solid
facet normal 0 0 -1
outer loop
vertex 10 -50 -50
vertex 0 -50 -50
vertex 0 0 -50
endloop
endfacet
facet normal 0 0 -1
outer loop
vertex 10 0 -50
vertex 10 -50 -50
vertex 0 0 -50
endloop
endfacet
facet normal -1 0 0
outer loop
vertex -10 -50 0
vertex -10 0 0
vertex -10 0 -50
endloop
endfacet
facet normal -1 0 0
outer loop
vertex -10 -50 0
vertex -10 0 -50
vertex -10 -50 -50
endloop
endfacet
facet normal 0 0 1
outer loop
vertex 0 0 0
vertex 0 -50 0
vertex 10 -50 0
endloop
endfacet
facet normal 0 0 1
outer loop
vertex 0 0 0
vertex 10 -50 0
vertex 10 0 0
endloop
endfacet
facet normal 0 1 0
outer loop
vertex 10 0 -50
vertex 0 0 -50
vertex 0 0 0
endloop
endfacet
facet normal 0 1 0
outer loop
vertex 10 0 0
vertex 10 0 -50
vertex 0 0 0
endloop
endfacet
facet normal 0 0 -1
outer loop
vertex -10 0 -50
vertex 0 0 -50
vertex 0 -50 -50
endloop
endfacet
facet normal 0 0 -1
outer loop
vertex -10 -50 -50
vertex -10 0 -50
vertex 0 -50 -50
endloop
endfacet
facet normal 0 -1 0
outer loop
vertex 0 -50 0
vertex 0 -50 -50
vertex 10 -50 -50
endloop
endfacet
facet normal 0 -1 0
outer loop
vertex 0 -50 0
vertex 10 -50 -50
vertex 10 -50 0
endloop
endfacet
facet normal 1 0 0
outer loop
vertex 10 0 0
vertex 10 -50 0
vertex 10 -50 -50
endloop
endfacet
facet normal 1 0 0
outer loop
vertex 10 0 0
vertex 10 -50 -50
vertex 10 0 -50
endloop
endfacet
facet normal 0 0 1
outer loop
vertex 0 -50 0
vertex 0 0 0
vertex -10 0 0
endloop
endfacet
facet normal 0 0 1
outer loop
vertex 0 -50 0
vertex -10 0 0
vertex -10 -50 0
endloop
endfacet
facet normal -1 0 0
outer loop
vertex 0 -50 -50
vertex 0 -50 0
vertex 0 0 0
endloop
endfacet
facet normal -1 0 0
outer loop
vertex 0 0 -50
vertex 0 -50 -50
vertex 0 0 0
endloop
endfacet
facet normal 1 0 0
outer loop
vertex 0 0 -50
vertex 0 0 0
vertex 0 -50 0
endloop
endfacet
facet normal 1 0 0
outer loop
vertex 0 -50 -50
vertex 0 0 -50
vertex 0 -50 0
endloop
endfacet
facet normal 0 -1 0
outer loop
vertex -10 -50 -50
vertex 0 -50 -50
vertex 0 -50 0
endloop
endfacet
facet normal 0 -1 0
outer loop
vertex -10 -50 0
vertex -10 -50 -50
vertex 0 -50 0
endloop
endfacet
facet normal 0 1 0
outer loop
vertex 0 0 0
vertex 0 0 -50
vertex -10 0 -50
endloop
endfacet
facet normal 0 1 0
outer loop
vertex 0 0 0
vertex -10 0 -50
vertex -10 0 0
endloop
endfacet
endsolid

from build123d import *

# Parameters (mm, degrees)
F0_W     = 50
F0_H     = 50
F1_DEPTH = 10
F2_W     = 50
F2_H     = 50
F3_DEPTH = 10


with BuildPart() as f1:
    # F0 (on Right) → F1 (new body)
    with BuildSketch(Plane.YZ):
        with Locations((-25, -25)):
            Rectangle(F0_W, F0_H)
    extrude(amount=F1_DEPTH)


with BuildPart() as f3:
    # F2 (on face) → F3 (new body)
    with BuildSketch(Plane(origin=(0, 0, 0), x_dir=(0, -1, 0), z_dir=(-1, 0, 0))):
        with Locations((25, -25)):
            Rectangle(F2_W, F2_H)
    extrude(amount=F3_DEPTH)


solid = Compound([f1.part, f3.part])
